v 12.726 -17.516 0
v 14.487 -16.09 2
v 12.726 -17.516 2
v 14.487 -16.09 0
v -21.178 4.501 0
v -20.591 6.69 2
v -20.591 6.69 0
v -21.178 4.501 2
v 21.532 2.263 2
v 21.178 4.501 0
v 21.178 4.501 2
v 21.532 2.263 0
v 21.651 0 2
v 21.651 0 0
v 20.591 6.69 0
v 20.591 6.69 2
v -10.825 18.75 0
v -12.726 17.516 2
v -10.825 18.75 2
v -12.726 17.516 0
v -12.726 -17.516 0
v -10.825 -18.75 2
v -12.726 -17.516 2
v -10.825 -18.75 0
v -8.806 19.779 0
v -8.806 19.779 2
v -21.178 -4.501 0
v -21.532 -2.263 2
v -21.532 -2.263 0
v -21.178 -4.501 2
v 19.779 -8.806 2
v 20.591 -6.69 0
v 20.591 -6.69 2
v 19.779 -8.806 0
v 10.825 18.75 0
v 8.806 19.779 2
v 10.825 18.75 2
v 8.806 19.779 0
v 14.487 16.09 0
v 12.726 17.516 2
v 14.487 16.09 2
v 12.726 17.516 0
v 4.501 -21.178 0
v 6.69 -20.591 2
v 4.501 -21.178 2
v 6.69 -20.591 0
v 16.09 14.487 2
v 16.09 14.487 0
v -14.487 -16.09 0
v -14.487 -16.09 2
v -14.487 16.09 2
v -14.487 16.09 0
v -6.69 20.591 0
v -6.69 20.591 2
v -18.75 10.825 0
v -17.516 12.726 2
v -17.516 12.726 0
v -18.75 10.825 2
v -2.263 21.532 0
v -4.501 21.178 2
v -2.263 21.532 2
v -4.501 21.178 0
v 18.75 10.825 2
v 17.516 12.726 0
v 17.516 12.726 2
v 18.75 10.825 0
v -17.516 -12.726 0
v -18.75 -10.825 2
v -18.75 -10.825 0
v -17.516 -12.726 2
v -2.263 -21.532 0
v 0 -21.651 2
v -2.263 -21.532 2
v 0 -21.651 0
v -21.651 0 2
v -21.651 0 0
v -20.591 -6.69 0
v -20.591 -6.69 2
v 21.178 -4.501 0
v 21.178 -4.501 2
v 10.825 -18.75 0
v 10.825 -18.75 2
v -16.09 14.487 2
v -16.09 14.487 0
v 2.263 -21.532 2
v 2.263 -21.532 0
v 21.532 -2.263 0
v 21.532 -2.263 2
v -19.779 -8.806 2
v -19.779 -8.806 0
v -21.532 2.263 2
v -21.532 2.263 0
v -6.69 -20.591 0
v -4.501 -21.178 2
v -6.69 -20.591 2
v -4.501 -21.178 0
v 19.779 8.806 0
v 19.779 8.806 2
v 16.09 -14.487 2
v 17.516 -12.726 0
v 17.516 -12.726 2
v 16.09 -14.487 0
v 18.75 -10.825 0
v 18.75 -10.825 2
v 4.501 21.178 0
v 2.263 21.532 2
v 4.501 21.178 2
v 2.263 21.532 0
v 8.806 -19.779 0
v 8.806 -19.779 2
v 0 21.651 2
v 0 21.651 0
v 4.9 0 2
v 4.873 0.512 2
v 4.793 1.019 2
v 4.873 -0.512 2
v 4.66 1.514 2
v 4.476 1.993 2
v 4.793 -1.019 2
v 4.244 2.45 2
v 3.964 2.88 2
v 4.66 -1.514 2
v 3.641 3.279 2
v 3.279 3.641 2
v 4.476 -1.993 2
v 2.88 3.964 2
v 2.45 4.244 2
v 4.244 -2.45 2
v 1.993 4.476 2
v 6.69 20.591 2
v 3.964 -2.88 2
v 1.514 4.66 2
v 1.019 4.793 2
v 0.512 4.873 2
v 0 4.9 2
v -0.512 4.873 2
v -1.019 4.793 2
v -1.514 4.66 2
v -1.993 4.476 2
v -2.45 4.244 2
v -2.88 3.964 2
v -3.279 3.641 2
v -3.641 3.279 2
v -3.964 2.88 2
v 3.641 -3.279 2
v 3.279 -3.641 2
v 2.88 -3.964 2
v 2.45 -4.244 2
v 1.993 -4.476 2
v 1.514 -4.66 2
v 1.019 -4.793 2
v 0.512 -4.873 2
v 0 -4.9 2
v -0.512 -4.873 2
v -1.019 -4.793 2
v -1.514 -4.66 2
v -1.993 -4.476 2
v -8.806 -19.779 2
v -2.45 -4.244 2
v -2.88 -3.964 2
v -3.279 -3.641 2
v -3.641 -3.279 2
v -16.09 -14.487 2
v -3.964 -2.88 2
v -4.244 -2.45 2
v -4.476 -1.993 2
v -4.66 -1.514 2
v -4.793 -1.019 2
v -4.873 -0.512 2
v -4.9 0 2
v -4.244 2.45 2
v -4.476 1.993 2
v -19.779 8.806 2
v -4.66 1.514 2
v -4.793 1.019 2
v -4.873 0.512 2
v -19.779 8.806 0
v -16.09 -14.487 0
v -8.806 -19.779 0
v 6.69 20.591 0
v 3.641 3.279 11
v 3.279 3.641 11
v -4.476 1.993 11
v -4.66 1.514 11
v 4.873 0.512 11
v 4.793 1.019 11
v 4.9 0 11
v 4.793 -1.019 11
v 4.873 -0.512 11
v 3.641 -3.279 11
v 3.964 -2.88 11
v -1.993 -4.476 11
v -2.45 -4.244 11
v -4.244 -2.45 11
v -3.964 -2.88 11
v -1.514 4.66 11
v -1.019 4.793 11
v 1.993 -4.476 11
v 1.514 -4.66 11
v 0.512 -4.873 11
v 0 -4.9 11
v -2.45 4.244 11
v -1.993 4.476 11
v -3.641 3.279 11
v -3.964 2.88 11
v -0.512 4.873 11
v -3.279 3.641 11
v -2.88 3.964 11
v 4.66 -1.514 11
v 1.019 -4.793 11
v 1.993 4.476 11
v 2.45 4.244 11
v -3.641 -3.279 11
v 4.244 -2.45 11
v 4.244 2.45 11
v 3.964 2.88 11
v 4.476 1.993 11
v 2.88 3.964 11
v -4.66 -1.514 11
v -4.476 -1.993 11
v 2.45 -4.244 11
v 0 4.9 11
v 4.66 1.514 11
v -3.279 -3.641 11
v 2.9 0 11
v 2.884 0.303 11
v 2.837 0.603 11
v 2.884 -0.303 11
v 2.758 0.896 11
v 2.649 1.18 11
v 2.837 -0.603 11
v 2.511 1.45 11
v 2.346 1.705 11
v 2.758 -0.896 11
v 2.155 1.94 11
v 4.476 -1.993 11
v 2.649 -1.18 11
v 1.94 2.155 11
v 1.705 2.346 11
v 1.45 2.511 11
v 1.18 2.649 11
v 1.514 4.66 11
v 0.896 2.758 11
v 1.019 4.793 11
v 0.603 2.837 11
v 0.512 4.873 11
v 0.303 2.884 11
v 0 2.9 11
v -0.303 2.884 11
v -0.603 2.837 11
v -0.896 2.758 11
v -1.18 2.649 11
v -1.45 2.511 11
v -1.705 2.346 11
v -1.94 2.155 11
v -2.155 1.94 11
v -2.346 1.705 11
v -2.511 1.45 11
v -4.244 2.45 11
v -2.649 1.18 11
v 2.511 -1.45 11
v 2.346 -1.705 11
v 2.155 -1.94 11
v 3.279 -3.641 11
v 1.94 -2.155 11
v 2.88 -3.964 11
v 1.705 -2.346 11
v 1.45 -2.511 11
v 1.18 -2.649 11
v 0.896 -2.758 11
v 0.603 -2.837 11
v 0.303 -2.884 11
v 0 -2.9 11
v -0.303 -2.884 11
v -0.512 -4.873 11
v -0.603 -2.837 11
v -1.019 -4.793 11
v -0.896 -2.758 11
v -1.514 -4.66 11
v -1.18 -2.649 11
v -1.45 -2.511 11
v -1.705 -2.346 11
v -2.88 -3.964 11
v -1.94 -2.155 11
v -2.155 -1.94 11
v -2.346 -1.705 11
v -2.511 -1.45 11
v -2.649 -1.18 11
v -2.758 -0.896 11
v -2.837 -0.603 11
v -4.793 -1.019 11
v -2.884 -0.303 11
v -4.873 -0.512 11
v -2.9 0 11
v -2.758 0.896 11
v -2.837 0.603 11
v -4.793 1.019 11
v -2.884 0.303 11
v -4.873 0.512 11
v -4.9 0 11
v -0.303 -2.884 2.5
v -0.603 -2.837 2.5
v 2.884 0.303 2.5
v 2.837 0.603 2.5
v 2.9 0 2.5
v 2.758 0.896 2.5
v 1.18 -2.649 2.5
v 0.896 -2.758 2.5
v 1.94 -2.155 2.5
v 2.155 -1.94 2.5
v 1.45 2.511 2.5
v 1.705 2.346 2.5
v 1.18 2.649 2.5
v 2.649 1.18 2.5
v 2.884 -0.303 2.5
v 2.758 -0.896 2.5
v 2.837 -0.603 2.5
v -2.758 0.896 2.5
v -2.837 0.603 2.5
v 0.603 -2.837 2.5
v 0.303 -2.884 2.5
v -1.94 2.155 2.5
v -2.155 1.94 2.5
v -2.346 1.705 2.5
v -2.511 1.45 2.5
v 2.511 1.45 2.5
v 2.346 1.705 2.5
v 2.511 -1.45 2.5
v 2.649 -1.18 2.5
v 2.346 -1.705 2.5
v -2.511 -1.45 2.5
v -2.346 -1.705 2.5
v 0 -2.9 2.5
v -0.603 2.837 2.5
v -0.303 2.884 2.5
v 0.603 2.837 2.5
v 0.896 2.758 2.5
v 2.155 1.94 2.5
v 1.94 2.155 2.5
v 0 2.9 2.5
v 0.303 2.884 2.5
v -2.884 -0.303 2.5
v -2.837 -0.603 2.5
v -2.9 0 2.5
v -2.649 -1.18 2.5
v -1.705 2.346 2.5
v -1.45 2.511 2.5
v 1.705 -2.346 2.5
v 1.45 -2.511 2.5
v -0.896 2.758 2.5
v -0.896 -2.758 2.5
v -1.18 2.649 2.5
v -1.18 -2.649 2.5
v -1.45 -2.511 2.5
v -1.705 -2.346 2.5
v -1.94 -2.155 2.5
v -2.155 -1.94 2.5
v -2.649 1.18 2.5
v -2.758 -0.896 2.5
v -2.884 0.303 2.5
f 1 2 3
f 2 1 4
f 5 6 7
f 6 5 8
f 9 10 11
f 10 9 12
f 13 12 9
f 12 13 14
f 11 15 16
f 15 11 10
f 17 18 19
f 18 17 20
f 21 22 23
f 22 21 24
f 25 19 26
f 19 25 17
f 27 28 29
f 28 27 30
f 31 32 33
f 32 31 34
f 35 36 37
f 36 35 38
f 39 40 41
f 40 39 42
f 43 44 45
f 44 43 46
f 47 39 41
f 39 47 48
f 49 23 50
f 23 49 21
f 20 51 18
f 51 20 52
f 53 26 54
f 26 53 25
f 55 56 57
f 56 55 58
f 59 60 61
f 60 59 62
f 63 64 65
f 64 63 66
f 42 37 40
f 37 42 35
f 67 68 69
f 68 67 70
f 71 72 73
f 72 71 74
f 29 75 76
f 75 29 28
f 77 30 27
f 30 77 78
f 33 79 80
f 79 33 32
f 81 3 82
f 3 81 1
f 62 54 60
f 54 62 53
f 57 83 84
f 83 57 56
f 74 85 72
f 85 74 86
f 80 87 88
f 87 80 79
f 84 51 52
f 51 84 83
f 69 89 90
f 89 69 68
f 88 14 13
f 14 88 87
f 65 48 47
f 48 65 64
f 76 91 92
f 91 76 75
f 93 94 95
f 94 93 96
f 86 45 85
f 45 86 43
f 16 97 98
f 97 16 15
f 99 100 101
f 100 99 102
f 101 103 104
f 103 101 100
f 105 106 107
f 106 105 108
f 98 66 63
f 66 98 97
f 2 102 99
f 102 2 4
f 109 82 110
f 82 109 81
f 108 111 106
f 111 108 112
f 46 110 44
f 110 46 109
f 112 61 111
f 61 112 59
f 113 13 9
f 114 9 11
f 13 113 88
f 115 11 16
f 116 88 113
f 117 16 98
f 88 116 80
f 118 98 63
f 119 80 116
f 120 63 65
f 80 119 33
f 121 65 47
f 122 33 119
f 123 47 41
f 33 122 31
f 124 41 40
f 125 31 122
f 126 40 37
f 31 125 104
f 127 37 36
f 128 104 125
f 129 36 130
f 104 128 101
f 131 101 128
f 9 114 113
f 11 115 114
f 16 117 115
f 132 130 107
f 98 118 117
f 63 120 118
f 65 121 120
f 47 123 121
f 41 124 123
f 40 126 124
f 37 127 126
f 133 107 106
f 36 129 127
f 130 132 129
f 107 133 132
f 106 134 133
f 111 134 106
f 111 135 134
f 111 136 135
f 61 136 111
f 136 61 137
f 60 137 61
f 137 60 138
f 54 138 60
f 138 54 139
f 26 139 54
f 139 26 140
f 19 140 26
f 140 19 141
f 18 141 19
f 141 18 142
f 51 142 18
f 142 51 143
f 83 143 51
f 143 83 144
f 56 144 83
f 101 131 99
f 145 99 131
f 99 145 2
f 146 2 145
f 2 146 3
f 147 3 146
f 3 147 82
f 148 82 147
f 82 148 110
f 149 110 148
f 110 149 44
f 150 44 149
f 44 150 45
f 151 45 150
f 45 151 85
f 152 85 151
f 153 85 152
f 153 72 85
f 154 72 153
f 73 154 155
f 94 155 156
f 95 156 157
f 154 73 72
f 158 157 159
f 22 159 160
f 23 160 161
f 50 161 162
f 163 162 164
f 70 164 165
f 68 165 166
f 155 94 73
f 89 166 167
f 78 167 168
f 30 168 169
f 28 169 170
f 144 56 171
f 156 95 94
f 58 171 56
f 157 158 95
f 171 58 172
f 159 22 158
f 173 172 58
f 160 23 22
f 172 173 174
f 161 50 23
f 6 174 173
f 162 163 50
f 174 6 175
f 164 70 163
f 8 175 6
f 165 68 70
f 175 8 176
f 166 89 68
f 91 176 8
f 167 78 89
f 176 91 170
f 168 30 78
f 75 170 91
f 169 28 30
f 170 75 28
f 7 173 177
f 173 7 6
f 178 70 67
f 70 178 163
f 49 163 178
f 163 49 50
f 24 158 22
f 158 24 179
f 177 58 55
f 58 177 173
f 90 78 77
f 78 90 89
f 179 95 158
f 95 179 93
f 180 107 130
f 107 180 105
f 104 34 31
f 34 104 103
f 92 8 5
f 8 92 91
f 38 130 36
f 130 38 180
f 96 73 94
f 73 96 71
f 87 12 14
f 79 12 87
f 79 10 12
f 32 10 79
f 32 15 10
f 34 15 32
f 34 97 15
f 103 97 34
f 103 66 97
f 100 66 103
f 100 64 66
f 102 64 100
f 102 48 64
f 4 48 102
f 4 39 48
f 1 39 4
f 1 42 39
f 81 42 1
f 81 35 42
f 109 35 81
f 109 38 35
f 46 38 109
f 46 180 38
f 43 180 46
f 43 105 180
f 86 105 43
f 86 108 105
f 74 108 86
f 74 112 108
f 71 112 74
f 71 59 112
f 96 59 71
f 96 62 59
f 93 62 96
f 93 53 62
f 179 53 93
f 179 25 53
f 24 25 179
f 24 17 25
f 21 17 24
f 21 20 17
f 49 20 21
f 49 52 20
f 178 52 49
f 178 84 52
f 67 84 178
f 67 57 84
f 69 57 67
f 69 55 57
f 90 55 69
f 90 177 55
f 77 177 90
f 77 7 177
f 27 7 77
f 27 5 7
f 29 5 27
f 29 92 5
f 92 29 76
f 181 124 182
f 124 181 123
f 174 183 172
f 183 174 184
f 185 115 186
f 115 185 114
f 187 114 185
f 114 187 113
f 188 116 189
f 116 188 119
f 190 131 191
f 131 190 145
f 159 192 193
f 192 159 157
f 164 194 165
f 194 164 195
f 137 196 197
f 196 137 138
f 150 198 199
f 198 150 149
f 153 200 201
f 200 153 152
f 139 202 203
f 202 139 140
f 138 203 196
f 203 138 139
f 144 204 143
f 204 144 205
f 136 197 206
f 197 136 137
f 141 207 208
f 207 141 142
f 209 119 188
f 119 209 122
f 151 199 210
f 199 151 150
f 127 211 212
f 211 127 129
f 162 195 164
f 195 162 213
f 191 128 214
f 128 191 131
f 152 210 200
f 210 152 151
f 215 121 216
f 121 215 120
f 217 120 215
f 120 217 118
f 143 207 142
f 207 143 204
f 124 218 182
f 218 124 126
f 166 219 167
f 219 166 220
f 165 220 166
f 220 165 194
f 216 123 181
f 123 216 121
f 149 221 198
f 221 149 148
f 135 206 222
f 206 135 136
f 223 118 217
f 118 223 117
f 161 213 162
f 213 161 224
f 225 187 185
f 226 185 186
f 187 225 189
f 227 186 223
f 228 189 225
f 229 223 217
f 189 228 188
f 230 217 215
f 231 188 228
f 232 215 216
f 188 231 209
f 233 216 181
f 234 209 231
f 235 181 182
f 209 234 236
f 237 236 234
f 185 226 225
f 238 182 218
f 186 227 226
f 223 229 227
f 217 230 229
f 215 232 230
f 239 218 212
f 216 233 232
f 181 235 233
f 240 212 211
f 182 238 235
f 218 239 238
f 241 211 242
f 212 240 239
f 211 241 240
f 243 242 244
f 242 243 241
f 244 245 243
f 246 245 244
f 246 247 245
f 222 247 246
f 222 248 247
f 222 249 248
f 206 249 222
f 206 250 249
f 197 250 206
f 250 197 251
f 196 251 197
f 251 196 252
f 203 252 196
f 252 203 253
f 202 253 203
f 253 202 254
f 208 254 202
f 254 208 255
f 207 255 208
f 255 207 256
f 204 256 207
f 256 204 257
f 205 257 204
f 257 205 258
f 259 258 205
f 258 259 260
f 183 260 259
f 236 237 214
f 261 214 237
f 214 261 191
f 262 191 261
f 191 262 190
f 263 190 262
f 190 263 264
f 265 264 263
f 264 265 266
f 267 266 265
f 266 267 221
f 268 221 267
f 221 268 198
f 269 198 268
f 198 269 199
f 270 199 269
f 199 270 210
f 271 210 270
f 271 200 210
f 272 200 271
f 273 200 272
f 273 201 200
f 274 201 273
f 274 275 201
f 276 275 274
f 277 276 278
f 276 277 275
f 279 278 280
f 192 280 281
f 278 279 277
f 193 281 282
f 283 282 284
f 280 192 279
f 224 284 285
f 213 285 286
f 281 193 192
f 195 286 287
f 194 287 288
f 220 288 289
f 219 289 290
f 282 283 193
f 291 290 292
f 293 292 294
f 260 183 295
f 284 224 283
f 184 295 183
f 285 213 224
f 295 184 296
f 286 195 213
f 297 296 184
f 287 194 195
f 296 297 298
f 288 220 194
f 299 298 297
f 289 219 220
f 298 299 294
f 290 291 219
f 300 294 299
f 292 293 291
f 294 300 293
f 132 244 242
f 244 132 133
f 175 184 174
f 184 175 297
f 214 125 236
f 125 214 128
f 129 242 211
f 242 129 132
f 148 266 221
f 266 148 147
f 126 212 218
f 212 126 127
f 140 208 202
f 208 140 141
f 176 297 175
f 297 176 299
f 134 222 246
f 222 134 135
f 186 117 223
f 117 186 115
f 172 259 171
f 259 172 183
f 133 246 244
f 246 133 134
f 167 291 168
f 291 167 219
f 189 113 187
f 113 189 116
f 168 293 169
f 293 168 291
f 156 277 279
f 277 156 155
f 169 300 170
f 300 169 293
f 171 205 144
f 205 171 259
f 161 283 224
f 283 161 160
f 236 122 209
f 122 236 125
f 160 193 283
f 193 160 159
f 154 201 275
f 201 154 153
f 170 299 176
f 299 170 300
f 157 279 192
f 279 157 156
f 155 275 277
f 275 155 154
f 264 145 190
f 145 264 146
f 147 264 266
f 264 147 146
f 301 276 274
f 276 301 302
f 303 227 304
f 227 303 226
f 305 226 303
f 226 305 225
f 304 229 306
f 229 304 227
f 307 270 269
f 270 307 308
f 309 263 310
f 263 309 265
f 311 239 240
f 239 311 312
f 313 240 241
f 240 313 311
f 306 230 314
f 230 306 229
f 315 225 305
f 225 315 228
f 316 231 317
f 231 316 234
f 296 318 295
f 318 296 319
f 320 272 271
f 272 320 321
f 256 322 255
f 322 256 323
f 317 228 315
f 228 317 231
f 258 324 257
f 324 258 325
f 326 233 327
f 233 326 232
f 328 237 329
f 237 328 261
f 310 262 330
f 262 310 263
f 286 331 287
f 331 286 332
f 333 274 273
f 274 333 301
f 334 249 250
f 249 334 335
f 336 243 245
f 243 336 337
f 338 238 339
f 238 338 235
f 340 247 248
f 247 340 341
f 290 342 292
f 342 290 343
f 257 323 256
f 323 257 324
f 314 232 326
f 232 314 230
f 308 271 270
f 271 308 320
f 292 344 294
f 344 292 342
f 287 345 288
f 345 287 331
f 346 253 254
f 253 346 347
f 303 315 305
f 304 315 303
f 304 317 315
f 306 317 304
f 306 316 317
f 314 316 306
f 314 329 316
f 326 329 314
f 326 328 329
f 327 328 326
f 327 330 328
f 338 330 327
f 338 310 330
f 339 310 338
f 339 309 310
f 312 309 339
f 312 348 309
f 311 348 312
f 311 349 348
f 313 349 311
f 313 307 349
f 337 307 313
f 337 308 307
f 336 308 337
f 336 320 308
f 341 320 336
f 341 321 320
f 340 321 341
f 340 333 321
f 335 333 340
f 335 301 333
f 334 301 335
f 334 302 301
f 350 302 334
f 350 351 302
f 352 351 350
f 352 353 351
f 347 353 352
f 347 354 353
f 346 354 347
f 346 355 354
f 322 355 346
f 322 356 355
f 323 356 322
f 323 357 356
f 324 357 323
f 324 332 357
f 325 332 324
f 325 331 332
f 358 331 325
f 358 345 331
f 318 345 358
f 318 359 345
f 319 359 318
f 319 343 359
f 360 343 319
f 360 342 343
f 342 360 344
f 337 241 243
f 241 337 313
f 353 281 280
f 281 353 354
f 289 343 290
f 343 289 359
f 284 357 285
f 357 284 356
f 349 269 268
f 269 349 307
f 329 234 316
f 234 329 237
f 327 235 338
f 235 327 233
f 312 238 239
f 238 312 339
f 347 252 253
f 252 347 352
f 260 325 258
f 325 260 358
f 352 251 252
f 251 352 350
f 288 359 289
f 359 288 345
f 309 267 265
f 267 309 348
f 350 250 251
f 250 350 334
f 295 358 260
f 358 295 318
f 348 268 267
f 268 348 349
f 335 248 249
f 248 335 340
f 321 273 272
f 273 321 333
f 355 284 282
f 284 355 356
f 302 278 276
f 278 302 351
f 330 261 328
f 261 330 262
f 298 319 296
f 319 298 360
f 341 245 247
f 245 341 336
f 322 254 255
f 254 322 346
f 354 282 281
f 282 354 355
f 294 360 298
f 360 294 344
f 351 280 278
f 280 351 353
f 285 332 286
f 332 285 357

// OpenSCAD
////////////////////////////////////////////////////////////////////////////////
// fiber optic lamp
////////////////////////////////////////////////////////////////////////////////


Radius3      = 2.5 ; // [2:0.1:10]
Width        = 2   ; // [1:0.1:5]
Delta        = 0.8 ; // [0:0.1:1]
WidthWS2812  = 5   ; // [4:0.1:6]
LengthWS2812 = 8   ; // [6:0.1:9]
mode         = "foot" ; // ["main", "top", "bottom", "ws2812", "foot"]

/* [Hidden] */

$fn = 60 ;

Area3 = PI * Radius3 * Radius3 ;
Area1 = Area3 * 3 ;
Radius1 = sqrt(Area1/PI) ;

if (false)
{
  echo(Radius1=Radius1) ;
  echo(Area1=Area1) ;
  echo(Radius3=Radius3) ;
  echo(Area3=Area3) ;
}

module Hole(R1, R3, W)
{
  union()
  {
    translate([0,0,1.8*R1])
      color("blue") cylinder(r=R1, h=2*R1) ;
    
    translate([0,0,R1])
      color("yellow") cylinder(r1=1.5*R1, r2=R1, h=R1) ;
    
    for (i=[0:2])
      rotate([0,0,120*i])
        translate([-2.5*R3, 0, 0])
        rotate([0,30,0])
        translate([0,0,-3.5*R3])
        color("green") cylinder(r=R3, h=5.5*R3+W) ;
  }
}

module Solid(R1, R3, W)
{
  union()
  {
    color("gray")
      translate([0,0,-3.3*R1])
      cylinder(r=R3, h=3.5*R1) ;

    minkowski()
    {
      sphere(r=W) ;
      hull()
      {
        color("pink")
          cylinder(r=1.5*(R1), h=2*R3) ;
    
        color("white")
          translate([0,0,R1+0.1])
          cylinder(r1=1.5*(R1), r2=(R1), h=R1*1.6) ;
      }
    }
    for (i=[0:2])
      rotate([0,0,120*i])
        translate([-2.5*R3, 0, 0])
        rotate([0,30,0])
        translate([0,0,-2.8*R3])
        color("green") cylinder(r=R3+W, h=4.5*R3+W) ;
  }
}


module Body(R1, R3, W)
{
  difference()
  {
    Solid(R1, R3, W) ;
    Hole(R1,R3,W) ;
  }
}

module Part(R1, R3, W, m)
{
  difference()
  {
    Body(R1, R3, W) ;

    if (mode == "top")
      translate([0,0,-4*R1])
        cylinder(r=3*R1+W, h=5*R1) ;

    if (mode == "bottom")
      translate([0,0,R1])
        cylinder(r=3*R1+W, h=R1*3) ;
  }
}

module Foot(R1, R3, W, delta)
{
  difference()
  {
    union()
    {
      color("blue")
        cylinder(r=5*R1, h=W) ;
      color("green")
        translate([0,0,W/2])
        cylinder(r=R3+W+delta/2, h=4*R3) ;
    }
    color("pink")
      translate([0,0,R3])
      cylinder(r=R3+delta/2, h=5*R3) ;
  }
}

module Ws2812(R1, R3, W, delta, Wws, Lws)
{
  difference()
  {
    color("green")
      cylinder(r=R3+2*W+delta/2, h=3*R3) ;

    color("red")
      translate([0,0,R3])
      cube([Wws+delta, Lws+delta, 3*R3], center=true) ;

    translate([0,0,1.8*R3])
      cylinder(r=R3+W+delta/2, h=2*R3) ;
  }
}

if      (mode == "main")    Body(Radius1, Radius3, Width) ;
else if (mode == "top")     Part(Radius1, Radius3, Width, mode) ;
else if (mode == "middle")  Part(Radius1, Radius3, Width, mode) ;
else if (mode == "bottom")  Part(Radius1, Radius3, Width, mode) ;
else if (mode == "ws2812")  Ws2812(Radius1, Radius3, Width, Delta, WidthWS2812, LengthWS2812) ;
else if (mode == "foot")    Foot(Radius1, Radius3, Width, Delta) ;
